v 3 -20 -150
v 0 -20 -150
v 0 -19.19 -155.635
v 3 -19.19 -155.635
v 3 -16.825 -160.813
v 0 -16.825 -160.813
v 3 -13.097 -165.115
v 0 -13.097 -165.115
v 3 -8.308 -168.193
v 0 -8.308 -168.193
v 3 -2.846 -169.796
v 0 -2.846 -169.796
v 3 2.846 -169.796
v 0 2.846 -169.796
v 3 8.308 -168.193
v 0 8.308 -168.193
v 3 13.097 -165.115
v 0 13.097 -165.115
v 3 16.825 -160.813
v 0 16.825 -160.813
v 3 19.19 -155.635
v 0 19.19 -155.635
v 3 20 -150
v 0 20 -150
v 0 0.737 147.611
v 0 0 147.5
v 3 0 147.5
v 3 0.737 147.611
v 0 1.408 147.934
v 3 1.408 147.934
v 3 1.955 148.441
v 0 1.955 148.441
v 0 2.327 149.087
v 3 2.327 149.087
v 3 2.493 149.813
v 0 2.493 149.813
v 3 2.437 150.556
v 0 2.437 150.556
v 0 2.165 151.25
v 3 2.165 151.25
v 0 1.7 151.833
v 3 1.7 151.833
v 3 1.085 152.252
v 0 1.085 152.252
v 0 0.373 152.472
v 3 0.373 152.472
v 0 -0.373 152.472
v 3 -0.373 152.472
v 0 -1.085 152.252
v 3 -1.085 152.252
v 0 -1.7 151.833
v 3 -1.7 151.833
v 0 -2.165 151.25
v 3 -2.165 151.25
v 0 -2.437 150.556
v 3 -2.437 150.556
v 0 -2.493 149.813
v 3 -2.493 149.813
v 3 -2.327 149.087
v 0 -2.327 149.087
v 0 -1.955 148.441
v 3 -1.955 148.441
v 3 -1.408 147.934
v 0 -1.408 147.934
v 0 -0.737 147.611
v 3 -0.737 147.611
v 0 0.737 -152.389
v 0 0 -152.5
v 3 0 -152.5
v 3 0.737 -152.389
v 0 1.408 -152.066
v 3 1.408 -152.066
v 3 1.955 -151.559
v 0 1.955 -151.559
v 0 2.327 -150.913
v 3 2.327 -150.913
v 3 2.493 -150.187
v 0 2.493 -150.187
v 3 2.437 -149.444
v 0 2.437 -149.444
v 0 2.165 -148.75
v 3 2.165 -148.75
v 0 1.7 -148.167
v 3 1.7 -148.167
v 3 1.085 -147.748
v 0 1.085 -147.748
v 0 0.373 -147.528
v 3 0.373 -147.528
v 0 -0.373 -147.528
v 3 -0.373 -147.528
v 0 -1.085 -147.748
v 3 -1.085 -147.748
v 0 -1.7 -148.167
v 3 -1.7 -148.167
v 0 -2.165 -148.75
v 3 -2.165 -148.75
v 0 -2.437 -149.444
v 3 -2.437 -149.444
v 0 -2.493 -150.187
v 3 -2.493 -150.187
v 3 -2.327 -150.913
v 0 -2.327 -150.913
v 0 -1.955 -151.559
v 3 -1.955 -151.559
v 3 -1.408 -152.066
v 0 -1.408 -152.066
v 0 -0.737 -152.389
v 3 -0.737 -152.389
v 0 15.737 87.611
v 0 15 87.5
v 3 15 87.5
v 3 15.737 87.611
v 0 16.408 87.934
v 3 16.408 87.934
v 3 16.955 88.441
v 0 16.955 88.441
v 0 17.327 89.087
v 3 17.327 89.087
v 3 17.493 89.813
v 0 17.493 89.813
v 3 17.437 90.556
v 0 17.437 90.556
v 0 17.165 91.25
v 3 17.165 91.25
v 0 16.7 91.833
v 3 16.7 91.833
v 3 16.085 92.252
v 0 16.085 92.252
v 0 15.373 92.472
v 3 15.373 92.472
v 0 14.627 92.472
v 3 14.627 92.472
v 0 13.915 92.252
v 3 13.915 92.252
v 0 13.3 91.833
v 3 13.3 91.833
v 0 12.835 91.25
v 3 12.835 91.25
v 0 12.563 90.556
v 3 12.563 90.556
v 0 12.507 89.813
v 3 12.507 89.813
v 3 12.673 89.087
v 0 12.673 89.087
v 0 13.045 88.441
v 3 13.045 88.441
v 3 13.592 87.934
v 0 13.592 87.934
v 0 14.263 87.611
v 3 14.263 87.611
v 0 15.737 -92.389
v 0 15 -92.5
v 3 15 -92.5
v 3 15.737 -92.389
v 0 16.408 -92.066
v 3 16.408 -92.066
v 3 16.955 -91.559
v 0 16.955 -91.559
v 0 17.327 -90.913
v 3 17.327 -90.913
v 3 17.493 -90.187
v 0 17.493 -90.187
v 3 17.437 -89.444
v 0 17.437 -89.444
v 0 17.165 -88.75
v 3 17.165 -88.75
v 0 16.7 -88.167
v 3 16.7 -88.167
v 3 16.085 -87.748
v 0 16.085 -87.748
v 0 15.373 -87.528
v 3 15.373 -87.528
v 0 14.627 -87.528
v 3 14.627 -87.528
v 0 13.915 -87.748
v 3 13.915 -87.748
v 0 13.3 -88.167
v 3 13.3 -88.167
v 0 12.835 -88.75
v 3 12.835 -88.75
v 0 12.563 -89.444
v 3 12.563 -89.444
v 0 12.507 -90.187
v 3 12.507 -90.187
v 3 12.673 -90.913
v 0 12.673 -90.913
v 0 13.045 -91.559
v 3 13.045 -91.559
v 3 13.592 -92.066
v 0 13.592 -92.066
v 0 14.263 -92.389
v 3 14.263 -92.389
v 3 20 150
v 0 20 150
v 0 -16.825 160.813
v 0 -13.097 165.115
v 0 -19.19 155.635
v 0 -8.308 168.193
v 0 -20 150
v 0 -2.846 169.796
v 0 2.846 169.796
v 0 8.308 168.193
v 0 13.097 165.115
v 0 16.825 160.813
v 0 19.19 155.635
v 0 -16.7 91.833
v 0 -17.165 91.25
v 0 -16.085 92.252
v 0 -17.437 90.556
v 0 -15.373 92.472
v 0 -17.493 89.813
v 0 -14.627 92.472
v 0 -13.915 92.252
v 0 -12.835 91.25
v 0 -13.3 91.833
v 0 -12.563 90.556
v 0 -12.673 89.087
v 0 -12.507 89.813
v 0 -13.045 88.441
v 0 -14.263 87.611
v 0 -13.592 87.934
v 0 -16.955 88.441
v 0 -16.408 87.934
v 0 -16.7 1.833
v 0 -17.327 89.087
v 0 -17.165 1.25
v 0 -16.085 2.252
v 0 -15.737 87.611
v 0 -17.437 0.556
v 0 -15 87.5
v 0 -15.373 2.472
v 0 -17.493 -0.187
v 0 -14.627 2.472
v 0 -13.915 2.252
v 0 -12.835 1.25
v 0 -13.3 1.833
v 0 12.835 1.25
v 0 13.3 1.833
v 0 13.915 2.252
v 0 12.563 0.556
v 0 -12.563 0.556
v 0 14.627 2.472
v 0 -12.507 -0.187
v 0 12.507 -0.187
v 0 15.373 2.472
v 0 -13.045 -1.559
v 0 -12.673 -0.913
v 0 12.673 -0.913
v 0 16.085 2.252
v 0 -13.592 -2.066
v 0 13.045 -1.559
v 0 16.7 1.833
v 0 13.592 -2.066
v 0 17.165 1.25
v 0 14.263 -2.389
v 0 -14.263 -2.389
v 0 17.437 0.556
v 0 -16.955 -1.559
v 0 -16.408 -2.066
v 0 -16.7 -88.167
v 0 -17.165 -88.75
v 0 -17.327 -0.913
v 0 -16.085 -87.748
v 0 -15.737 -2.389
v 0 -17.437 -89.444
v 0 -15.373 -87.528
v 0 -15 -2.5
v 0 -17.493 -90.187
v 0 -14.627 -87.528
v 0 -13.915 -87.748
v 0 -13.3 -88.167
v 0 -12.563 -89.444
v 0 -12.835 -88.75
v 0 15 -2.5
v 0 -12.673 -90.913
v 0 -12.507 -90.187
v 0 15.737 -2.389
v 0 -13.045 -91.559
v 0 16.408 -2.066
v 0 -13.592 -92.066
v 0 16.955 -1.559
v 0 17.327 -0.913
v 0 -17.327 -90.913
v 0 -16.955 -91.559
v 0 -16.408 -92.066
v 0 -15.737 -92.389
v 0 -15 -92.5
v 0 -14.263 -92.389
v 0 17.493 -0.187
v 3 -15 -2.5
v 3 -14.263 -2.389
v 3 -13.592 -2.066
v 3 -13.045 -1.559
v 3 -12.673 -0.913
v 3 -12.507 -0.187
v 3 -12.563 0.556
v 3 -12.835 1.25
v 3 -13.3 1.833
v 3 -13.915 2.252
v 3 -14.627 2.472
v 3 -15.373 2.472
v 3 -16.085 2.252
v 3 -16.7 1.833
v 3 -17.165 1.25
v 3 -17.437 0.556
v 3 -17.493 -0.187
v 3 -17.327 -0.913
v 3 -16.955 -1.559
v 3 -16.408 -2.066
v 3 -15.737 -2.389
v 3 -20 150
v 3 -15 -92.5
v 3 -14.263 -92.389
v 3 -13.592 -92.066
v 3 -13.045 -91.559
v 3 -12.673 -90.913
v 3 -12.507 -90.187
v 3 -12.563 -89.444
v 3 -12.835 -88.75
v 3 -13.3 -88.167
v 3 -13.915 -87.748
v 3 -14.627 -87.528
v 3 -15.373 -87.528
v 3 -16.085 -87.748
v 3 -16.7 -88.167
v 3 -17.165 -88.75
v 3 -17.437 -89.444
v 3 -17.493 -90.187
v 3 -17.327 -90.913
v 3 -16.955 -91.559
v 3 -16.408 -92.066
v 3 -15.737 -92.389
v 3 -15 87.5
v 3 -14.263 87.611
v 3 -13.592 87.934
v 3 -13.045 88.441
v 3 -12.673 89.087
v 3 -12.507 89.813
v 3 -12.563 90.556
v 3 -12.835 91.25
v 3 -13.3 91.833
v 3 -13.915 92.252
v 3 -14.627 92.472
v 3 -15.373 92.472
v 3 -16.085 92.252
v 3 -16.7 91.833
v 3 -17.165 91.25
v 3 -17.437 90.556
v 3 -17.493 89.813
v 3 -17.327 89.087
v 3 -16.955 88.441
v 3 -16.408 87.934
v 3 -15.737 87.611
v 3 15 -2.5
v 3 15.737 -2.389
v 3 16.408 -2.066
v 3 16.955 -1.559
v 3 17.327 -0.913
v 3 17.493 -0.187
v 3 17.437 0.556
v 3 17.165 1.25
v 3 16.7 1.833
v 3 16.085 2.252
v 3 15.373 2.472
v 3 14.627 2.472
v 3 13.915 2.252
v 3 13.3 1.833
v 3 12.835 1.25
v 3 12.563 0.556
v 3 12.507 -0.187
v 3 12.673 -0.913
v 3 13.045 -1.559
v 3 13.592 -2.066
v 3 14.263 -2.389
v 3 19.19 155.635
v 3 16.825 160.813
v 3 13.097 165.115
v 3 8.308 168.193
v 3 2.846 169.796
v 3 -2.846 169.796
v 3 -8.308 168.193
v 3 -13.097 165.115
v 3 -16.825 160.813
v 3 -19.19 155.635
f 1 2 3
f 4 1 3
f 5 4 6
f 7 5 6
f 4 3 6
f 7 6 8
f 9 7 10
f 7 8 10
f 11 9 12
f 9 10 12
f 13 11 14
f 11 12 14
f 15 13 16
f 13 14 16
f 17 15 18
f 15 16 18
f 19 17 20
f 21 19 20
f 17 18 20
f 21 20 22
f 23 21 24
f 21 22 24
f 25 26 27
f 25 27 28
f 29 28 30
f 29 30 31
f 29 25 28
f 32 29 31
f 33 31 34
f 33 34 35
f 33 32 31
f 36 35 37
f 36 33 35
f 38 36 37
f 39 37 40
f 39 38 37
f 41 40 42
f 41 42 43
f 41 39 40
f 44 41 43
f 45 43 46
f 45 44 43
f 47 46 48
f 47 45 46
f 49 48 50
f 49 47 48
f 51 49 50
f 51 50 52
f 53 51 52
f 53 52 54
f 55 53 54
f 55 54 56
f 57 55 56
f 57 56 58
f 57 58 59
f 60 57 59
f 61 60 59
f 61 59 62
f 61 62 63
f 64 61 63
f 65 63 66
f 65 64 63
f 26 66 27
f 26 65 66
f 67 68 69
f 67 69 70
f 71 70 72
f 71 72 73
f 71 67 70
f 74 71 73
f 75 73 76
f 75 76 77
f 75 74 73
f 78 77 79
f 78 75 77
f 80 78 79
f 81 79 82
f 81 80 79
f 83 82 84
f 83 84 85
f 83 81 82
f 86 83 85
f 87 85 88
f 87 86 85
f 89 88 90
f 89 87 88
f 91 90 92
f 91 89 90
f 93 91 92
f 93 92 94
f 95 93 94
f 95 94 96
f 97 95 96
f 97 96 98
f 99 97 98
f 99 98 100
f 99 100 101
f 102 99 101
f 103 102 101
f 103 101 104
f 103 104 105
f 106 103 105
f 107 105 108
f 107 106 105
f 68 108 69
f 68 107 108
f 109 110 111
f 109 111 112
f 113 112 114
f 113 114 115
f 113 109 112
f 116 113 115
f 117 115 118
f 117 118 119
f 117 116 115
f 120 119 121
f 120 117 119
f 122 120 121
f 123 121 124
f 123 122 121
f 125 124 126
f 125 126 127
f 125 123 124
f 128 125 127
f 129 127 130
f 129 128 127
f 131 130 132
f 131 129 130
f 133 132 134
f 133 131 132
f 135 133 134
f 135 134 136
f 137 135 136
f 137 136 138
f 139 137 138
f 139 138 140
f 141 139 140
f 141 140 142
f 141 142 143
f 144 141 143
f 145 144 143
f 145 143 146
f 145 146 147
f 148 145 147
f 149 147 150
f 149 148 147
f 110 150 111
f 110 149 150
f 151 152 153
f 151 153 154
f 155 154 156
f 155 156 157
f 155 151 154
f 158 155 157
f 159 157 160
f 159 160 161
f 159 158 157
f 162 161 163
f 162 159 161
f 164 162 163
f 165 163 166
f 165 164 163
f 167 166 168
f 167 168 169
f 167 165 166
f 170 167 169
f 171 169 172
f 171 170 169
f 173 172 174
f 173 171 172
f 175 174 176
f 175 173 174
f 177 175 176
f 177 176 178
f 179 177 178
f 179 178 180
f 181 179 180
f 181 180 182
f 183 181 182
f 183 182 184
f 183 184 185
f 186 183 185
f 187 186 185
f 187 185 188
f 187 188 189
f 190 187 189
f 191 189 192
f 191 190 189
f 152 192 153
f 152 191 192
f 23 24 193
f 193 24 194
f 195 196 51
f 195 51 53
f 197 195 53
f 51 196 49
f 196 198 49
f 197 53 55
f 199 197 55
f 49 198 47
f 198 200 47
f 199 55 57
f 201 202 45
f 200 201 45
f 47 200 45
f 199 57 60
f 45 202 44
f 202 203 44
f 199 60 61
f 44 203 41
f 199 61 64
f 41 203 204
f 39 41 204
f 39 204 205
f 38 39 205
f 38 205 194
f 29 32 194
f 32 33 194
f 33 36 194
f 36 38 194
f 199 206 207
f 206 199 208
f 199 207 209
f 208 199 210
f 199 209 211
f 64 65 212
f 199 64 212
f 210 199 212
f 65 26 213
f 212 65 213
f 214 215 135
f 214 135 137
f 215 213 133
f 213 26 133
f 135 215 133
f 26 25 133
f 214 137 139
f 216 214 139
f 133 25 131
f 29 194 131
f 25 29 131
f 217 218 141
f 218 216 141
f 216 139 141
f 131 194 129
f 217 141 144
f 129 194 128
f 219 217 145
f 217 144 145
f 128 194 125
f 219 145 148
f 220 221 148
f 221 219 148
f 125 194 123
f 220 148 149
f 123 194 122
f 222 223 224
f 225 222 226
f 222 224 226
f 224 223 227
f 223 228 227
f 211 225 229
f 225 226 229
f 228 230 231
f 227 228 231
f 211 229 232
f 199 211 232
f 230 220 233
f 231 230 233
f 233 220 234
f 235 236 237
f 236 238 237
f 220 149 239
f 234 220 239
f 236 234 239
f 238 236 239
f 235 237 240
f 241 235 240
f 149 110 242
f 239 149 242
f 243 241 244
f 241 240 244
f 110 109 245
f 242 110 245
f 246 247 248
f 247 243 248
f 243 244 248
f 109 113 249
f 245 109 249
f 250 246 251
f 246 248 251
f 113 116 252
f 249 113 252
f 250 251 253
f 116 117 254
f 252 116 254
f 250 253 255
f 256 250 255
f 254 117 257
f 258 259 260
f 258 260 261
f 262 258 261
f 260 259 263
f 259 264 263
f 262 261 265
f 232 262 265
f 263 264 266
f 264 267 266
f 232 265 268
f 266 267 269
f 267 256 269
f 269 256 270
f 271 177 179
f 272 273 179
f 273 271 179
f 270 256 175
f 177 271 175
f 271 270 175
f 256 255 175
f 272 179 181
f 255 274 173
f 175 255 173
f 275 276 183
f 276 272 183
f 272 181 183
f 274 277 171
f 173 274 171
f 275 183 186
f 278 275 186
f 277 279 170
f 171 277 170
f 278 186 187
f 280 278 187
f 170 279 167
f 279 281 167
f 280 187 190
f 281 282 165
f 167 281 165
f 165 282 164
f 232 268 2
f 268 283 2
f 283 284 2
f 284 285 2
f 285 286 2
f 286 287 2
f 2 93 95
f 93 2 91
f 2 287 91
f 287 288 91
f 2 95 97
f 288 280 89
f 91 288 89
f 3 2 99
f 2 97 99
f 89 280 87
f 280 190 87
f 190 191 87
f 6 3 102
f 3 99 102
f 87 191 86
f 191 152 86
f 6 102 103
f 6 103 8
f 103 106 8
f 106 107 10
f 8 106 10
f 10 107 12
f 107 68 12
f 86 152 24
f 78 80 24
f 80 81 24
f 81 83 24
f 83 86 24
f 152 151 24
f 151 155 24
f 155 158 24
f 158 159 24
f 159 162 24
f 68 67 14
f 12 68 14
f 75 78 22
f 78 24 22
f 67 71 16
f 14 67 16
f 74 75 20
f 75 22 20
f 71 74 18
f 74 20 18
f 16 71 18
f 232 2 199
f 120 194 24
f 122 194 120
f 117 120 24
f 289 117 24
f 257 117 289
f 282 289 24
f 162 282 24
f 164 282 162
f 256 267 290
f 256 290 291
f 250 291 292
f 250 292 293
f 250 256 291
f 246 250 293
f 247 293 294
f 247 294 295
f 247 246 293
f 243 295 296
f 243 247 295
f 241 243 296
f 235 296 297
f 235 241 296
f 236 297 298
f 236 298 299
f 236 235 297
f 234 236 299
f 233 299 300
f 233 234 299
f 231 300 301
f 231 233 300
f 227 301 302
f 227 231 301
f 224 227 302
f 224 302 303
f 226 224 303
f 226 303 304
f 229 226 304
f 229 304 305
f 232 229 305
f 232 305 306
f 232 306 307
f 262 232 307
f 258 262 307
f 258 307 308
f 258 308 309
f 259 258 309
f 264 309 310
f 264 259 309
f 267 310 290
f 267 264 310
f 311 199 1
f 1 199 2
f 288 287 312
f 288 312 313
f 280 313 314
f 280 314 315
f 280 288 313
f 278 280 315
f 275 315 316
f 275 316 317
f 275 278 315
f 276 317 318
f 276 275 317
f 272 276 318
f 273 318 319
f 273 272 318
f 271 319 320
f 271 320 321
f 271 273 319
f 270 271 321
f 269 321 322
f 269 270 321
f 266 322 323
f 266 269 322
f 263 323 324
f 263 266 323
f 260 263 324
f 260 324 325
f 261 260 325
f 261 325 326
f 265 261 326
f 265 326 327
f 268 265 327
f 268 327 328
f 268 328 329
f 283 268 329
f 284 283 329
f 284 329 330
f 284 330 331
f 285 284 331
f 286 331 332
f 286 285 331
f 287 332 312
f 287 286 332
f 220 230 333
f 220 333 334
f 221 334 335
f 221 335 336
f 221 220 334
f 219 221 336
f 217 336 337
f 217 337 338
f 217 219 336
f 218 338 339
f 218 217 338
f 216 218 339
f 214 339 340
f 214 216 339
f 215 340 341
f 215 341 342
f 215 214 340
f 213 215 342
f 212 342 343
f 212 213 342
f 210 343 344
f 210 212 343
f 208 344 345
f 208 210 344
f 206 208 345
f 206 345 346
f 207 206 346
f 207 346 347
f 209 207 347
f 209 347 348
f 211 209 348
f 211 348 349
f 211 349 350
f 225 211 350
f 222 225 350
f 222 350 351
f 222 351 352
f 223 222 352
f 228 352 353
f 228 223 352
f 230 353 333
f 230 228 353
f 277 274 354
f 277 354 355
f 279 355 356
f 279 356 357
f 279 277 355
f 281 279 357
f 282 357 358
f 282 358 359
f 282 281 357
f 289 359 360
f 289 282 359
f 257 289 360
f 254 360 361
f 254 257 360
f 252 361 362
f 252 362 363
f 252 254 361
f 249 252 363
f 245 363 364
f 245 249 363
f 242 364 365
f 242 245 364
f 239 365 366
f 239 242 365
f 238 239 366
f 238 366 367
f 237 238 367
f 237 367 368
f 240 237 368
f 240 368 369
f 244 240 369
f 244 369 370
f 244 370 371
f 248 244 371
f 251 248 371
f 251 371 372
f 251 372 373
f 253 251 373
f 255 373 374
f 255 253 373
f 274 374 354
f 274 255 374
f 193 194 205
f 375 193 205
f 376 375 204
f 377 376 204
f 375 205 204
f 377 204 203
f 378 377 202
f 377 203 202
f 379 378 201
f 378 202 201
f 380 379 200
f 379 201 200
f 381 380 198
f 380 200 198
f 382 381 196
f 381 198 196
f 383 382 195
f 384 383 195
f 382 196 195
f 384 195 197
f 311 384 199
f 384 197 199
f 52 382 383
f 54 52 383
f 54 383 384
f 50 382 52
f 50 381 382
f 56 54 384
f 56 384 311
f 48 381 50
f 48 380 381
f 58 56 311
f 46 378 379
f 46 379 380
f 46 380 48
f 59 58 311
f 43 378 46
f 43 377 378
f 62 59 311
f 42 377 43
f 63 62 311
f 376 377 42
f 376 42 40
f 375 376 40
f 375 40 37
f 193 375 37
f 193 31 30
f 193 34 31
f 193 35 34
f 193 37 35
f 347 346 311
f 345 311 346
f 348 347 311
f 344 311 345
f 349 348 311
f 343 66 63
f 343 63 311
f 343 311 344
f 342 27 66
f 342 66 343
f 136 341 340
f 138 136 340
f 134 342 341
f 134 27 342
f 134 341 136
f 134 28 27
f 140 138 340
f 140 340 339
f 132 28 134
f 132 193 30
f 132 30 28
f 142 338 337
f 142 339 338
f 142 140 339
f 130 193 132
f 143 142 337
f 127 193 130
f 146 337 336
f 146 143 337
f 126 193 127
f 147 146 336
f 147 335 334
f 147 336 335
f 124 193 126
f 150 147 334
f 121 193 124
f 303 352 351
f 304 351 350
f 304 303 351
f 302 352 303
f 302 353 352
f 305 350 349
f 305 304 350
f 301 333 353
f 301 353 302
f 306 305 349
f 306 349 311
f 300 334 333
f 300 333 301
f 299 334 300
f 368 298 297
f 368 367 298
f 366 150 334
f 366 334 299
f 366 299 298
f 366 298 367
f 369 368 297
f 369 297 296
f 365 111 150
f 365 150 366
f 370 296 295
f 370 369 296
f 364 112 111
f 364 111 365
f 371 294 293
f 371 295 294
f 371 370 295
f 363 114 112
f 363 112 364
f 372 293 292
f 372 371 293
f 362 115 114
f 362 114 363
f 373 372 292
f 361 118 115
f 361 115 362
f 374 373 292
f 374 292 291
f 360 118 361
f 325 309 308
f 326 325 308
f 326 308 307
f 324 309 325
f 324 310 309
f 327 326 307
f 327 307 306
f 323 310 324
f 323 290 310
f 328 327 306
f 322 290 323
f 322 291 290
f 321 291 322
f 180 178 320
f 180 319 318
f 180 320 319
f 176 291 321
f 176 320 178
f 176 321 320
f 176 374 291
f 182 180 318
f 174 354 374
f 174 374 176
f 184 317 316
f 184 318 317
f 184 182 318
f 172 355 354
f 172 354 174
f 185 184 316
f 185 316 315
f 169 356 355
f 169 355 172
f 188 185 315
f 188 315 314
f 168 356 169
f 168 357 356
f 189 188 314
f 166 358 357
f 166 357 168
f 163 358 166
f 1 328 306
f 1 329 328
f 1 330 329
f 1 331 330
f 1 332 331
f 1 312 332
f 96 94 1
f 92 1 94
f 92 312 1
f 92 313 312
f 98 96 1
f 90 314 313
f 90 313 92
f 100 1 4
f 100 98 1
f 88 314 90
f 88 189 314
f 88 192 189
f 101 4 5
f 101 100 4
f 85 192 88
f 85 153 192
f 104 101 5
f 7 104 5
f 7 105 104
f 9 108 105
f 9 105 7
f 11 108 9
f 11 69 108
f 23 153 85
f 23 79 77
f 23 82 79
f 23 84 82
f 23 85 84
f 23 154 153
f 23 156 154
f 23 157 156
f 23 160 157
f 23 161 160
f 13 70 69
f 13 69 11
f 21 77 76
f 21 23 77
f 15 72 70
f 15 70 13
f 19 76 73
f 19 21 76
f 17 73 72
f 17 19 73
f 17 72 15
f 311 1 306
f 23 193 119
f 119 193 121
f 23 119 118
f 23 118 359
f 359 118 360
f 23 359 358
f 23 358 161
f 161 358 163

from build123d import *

# Parameters (mm, degrees)
SKETCH1_R           = 2.5
BOSS_EXTRUDE1_DEPTH = 3


with BuildPart() as part:
    # Sketch1 → Boss-Extrude1 (new body)
    with BuildSketch(Plane(origin=(0, 0, 0), x_dir=(0, 0, -1), z_dir=(1, 0, 0))):
        with BuildLine():
            Line((-150, -20), (150, -20))
            ThreePointArc((150, -20), (170, 0), (150, 20))
            Line((150, 20), (-150, 20))
            ThreePointArc((-150, 20), (-170, 0), (-150, -20))
        make_face()
        with Locations((150, 0)):
            Circle(SKETCH1_R, mode=Mode.SUBTRACT)
        with Locations((-150, 0)):
            Circle(SKETCH1_R, mode=Mode.SUBTRACT)
        with Locations((90, 15)):
            Circle(SKETCH1_R, mode=Mode.SUBTRACT)
        with Locations((90, -15)):
            Circle(SKETCH1_R, mode=Mode.SUBTRACT)
        with Locations((-90, 15)):
            Circle(SKETCH1_R, mode=Mode.SUBTRACT)
        with Locations((-90, -15)):
            Circle(SKETCH1_R, mode=Mode.SUBTRACT)
        with Locations((0, 15)):
            Circle(SKETCH1_R, mode=Mode.SUBTRACT)
        with Locations((0, -15)):
            Circle(SKETCH1_R, mode=Mode.SUBTRACT)
    extrude(amount=BOSS_EXTRUDE1_DEPTH)


solid = part.part
